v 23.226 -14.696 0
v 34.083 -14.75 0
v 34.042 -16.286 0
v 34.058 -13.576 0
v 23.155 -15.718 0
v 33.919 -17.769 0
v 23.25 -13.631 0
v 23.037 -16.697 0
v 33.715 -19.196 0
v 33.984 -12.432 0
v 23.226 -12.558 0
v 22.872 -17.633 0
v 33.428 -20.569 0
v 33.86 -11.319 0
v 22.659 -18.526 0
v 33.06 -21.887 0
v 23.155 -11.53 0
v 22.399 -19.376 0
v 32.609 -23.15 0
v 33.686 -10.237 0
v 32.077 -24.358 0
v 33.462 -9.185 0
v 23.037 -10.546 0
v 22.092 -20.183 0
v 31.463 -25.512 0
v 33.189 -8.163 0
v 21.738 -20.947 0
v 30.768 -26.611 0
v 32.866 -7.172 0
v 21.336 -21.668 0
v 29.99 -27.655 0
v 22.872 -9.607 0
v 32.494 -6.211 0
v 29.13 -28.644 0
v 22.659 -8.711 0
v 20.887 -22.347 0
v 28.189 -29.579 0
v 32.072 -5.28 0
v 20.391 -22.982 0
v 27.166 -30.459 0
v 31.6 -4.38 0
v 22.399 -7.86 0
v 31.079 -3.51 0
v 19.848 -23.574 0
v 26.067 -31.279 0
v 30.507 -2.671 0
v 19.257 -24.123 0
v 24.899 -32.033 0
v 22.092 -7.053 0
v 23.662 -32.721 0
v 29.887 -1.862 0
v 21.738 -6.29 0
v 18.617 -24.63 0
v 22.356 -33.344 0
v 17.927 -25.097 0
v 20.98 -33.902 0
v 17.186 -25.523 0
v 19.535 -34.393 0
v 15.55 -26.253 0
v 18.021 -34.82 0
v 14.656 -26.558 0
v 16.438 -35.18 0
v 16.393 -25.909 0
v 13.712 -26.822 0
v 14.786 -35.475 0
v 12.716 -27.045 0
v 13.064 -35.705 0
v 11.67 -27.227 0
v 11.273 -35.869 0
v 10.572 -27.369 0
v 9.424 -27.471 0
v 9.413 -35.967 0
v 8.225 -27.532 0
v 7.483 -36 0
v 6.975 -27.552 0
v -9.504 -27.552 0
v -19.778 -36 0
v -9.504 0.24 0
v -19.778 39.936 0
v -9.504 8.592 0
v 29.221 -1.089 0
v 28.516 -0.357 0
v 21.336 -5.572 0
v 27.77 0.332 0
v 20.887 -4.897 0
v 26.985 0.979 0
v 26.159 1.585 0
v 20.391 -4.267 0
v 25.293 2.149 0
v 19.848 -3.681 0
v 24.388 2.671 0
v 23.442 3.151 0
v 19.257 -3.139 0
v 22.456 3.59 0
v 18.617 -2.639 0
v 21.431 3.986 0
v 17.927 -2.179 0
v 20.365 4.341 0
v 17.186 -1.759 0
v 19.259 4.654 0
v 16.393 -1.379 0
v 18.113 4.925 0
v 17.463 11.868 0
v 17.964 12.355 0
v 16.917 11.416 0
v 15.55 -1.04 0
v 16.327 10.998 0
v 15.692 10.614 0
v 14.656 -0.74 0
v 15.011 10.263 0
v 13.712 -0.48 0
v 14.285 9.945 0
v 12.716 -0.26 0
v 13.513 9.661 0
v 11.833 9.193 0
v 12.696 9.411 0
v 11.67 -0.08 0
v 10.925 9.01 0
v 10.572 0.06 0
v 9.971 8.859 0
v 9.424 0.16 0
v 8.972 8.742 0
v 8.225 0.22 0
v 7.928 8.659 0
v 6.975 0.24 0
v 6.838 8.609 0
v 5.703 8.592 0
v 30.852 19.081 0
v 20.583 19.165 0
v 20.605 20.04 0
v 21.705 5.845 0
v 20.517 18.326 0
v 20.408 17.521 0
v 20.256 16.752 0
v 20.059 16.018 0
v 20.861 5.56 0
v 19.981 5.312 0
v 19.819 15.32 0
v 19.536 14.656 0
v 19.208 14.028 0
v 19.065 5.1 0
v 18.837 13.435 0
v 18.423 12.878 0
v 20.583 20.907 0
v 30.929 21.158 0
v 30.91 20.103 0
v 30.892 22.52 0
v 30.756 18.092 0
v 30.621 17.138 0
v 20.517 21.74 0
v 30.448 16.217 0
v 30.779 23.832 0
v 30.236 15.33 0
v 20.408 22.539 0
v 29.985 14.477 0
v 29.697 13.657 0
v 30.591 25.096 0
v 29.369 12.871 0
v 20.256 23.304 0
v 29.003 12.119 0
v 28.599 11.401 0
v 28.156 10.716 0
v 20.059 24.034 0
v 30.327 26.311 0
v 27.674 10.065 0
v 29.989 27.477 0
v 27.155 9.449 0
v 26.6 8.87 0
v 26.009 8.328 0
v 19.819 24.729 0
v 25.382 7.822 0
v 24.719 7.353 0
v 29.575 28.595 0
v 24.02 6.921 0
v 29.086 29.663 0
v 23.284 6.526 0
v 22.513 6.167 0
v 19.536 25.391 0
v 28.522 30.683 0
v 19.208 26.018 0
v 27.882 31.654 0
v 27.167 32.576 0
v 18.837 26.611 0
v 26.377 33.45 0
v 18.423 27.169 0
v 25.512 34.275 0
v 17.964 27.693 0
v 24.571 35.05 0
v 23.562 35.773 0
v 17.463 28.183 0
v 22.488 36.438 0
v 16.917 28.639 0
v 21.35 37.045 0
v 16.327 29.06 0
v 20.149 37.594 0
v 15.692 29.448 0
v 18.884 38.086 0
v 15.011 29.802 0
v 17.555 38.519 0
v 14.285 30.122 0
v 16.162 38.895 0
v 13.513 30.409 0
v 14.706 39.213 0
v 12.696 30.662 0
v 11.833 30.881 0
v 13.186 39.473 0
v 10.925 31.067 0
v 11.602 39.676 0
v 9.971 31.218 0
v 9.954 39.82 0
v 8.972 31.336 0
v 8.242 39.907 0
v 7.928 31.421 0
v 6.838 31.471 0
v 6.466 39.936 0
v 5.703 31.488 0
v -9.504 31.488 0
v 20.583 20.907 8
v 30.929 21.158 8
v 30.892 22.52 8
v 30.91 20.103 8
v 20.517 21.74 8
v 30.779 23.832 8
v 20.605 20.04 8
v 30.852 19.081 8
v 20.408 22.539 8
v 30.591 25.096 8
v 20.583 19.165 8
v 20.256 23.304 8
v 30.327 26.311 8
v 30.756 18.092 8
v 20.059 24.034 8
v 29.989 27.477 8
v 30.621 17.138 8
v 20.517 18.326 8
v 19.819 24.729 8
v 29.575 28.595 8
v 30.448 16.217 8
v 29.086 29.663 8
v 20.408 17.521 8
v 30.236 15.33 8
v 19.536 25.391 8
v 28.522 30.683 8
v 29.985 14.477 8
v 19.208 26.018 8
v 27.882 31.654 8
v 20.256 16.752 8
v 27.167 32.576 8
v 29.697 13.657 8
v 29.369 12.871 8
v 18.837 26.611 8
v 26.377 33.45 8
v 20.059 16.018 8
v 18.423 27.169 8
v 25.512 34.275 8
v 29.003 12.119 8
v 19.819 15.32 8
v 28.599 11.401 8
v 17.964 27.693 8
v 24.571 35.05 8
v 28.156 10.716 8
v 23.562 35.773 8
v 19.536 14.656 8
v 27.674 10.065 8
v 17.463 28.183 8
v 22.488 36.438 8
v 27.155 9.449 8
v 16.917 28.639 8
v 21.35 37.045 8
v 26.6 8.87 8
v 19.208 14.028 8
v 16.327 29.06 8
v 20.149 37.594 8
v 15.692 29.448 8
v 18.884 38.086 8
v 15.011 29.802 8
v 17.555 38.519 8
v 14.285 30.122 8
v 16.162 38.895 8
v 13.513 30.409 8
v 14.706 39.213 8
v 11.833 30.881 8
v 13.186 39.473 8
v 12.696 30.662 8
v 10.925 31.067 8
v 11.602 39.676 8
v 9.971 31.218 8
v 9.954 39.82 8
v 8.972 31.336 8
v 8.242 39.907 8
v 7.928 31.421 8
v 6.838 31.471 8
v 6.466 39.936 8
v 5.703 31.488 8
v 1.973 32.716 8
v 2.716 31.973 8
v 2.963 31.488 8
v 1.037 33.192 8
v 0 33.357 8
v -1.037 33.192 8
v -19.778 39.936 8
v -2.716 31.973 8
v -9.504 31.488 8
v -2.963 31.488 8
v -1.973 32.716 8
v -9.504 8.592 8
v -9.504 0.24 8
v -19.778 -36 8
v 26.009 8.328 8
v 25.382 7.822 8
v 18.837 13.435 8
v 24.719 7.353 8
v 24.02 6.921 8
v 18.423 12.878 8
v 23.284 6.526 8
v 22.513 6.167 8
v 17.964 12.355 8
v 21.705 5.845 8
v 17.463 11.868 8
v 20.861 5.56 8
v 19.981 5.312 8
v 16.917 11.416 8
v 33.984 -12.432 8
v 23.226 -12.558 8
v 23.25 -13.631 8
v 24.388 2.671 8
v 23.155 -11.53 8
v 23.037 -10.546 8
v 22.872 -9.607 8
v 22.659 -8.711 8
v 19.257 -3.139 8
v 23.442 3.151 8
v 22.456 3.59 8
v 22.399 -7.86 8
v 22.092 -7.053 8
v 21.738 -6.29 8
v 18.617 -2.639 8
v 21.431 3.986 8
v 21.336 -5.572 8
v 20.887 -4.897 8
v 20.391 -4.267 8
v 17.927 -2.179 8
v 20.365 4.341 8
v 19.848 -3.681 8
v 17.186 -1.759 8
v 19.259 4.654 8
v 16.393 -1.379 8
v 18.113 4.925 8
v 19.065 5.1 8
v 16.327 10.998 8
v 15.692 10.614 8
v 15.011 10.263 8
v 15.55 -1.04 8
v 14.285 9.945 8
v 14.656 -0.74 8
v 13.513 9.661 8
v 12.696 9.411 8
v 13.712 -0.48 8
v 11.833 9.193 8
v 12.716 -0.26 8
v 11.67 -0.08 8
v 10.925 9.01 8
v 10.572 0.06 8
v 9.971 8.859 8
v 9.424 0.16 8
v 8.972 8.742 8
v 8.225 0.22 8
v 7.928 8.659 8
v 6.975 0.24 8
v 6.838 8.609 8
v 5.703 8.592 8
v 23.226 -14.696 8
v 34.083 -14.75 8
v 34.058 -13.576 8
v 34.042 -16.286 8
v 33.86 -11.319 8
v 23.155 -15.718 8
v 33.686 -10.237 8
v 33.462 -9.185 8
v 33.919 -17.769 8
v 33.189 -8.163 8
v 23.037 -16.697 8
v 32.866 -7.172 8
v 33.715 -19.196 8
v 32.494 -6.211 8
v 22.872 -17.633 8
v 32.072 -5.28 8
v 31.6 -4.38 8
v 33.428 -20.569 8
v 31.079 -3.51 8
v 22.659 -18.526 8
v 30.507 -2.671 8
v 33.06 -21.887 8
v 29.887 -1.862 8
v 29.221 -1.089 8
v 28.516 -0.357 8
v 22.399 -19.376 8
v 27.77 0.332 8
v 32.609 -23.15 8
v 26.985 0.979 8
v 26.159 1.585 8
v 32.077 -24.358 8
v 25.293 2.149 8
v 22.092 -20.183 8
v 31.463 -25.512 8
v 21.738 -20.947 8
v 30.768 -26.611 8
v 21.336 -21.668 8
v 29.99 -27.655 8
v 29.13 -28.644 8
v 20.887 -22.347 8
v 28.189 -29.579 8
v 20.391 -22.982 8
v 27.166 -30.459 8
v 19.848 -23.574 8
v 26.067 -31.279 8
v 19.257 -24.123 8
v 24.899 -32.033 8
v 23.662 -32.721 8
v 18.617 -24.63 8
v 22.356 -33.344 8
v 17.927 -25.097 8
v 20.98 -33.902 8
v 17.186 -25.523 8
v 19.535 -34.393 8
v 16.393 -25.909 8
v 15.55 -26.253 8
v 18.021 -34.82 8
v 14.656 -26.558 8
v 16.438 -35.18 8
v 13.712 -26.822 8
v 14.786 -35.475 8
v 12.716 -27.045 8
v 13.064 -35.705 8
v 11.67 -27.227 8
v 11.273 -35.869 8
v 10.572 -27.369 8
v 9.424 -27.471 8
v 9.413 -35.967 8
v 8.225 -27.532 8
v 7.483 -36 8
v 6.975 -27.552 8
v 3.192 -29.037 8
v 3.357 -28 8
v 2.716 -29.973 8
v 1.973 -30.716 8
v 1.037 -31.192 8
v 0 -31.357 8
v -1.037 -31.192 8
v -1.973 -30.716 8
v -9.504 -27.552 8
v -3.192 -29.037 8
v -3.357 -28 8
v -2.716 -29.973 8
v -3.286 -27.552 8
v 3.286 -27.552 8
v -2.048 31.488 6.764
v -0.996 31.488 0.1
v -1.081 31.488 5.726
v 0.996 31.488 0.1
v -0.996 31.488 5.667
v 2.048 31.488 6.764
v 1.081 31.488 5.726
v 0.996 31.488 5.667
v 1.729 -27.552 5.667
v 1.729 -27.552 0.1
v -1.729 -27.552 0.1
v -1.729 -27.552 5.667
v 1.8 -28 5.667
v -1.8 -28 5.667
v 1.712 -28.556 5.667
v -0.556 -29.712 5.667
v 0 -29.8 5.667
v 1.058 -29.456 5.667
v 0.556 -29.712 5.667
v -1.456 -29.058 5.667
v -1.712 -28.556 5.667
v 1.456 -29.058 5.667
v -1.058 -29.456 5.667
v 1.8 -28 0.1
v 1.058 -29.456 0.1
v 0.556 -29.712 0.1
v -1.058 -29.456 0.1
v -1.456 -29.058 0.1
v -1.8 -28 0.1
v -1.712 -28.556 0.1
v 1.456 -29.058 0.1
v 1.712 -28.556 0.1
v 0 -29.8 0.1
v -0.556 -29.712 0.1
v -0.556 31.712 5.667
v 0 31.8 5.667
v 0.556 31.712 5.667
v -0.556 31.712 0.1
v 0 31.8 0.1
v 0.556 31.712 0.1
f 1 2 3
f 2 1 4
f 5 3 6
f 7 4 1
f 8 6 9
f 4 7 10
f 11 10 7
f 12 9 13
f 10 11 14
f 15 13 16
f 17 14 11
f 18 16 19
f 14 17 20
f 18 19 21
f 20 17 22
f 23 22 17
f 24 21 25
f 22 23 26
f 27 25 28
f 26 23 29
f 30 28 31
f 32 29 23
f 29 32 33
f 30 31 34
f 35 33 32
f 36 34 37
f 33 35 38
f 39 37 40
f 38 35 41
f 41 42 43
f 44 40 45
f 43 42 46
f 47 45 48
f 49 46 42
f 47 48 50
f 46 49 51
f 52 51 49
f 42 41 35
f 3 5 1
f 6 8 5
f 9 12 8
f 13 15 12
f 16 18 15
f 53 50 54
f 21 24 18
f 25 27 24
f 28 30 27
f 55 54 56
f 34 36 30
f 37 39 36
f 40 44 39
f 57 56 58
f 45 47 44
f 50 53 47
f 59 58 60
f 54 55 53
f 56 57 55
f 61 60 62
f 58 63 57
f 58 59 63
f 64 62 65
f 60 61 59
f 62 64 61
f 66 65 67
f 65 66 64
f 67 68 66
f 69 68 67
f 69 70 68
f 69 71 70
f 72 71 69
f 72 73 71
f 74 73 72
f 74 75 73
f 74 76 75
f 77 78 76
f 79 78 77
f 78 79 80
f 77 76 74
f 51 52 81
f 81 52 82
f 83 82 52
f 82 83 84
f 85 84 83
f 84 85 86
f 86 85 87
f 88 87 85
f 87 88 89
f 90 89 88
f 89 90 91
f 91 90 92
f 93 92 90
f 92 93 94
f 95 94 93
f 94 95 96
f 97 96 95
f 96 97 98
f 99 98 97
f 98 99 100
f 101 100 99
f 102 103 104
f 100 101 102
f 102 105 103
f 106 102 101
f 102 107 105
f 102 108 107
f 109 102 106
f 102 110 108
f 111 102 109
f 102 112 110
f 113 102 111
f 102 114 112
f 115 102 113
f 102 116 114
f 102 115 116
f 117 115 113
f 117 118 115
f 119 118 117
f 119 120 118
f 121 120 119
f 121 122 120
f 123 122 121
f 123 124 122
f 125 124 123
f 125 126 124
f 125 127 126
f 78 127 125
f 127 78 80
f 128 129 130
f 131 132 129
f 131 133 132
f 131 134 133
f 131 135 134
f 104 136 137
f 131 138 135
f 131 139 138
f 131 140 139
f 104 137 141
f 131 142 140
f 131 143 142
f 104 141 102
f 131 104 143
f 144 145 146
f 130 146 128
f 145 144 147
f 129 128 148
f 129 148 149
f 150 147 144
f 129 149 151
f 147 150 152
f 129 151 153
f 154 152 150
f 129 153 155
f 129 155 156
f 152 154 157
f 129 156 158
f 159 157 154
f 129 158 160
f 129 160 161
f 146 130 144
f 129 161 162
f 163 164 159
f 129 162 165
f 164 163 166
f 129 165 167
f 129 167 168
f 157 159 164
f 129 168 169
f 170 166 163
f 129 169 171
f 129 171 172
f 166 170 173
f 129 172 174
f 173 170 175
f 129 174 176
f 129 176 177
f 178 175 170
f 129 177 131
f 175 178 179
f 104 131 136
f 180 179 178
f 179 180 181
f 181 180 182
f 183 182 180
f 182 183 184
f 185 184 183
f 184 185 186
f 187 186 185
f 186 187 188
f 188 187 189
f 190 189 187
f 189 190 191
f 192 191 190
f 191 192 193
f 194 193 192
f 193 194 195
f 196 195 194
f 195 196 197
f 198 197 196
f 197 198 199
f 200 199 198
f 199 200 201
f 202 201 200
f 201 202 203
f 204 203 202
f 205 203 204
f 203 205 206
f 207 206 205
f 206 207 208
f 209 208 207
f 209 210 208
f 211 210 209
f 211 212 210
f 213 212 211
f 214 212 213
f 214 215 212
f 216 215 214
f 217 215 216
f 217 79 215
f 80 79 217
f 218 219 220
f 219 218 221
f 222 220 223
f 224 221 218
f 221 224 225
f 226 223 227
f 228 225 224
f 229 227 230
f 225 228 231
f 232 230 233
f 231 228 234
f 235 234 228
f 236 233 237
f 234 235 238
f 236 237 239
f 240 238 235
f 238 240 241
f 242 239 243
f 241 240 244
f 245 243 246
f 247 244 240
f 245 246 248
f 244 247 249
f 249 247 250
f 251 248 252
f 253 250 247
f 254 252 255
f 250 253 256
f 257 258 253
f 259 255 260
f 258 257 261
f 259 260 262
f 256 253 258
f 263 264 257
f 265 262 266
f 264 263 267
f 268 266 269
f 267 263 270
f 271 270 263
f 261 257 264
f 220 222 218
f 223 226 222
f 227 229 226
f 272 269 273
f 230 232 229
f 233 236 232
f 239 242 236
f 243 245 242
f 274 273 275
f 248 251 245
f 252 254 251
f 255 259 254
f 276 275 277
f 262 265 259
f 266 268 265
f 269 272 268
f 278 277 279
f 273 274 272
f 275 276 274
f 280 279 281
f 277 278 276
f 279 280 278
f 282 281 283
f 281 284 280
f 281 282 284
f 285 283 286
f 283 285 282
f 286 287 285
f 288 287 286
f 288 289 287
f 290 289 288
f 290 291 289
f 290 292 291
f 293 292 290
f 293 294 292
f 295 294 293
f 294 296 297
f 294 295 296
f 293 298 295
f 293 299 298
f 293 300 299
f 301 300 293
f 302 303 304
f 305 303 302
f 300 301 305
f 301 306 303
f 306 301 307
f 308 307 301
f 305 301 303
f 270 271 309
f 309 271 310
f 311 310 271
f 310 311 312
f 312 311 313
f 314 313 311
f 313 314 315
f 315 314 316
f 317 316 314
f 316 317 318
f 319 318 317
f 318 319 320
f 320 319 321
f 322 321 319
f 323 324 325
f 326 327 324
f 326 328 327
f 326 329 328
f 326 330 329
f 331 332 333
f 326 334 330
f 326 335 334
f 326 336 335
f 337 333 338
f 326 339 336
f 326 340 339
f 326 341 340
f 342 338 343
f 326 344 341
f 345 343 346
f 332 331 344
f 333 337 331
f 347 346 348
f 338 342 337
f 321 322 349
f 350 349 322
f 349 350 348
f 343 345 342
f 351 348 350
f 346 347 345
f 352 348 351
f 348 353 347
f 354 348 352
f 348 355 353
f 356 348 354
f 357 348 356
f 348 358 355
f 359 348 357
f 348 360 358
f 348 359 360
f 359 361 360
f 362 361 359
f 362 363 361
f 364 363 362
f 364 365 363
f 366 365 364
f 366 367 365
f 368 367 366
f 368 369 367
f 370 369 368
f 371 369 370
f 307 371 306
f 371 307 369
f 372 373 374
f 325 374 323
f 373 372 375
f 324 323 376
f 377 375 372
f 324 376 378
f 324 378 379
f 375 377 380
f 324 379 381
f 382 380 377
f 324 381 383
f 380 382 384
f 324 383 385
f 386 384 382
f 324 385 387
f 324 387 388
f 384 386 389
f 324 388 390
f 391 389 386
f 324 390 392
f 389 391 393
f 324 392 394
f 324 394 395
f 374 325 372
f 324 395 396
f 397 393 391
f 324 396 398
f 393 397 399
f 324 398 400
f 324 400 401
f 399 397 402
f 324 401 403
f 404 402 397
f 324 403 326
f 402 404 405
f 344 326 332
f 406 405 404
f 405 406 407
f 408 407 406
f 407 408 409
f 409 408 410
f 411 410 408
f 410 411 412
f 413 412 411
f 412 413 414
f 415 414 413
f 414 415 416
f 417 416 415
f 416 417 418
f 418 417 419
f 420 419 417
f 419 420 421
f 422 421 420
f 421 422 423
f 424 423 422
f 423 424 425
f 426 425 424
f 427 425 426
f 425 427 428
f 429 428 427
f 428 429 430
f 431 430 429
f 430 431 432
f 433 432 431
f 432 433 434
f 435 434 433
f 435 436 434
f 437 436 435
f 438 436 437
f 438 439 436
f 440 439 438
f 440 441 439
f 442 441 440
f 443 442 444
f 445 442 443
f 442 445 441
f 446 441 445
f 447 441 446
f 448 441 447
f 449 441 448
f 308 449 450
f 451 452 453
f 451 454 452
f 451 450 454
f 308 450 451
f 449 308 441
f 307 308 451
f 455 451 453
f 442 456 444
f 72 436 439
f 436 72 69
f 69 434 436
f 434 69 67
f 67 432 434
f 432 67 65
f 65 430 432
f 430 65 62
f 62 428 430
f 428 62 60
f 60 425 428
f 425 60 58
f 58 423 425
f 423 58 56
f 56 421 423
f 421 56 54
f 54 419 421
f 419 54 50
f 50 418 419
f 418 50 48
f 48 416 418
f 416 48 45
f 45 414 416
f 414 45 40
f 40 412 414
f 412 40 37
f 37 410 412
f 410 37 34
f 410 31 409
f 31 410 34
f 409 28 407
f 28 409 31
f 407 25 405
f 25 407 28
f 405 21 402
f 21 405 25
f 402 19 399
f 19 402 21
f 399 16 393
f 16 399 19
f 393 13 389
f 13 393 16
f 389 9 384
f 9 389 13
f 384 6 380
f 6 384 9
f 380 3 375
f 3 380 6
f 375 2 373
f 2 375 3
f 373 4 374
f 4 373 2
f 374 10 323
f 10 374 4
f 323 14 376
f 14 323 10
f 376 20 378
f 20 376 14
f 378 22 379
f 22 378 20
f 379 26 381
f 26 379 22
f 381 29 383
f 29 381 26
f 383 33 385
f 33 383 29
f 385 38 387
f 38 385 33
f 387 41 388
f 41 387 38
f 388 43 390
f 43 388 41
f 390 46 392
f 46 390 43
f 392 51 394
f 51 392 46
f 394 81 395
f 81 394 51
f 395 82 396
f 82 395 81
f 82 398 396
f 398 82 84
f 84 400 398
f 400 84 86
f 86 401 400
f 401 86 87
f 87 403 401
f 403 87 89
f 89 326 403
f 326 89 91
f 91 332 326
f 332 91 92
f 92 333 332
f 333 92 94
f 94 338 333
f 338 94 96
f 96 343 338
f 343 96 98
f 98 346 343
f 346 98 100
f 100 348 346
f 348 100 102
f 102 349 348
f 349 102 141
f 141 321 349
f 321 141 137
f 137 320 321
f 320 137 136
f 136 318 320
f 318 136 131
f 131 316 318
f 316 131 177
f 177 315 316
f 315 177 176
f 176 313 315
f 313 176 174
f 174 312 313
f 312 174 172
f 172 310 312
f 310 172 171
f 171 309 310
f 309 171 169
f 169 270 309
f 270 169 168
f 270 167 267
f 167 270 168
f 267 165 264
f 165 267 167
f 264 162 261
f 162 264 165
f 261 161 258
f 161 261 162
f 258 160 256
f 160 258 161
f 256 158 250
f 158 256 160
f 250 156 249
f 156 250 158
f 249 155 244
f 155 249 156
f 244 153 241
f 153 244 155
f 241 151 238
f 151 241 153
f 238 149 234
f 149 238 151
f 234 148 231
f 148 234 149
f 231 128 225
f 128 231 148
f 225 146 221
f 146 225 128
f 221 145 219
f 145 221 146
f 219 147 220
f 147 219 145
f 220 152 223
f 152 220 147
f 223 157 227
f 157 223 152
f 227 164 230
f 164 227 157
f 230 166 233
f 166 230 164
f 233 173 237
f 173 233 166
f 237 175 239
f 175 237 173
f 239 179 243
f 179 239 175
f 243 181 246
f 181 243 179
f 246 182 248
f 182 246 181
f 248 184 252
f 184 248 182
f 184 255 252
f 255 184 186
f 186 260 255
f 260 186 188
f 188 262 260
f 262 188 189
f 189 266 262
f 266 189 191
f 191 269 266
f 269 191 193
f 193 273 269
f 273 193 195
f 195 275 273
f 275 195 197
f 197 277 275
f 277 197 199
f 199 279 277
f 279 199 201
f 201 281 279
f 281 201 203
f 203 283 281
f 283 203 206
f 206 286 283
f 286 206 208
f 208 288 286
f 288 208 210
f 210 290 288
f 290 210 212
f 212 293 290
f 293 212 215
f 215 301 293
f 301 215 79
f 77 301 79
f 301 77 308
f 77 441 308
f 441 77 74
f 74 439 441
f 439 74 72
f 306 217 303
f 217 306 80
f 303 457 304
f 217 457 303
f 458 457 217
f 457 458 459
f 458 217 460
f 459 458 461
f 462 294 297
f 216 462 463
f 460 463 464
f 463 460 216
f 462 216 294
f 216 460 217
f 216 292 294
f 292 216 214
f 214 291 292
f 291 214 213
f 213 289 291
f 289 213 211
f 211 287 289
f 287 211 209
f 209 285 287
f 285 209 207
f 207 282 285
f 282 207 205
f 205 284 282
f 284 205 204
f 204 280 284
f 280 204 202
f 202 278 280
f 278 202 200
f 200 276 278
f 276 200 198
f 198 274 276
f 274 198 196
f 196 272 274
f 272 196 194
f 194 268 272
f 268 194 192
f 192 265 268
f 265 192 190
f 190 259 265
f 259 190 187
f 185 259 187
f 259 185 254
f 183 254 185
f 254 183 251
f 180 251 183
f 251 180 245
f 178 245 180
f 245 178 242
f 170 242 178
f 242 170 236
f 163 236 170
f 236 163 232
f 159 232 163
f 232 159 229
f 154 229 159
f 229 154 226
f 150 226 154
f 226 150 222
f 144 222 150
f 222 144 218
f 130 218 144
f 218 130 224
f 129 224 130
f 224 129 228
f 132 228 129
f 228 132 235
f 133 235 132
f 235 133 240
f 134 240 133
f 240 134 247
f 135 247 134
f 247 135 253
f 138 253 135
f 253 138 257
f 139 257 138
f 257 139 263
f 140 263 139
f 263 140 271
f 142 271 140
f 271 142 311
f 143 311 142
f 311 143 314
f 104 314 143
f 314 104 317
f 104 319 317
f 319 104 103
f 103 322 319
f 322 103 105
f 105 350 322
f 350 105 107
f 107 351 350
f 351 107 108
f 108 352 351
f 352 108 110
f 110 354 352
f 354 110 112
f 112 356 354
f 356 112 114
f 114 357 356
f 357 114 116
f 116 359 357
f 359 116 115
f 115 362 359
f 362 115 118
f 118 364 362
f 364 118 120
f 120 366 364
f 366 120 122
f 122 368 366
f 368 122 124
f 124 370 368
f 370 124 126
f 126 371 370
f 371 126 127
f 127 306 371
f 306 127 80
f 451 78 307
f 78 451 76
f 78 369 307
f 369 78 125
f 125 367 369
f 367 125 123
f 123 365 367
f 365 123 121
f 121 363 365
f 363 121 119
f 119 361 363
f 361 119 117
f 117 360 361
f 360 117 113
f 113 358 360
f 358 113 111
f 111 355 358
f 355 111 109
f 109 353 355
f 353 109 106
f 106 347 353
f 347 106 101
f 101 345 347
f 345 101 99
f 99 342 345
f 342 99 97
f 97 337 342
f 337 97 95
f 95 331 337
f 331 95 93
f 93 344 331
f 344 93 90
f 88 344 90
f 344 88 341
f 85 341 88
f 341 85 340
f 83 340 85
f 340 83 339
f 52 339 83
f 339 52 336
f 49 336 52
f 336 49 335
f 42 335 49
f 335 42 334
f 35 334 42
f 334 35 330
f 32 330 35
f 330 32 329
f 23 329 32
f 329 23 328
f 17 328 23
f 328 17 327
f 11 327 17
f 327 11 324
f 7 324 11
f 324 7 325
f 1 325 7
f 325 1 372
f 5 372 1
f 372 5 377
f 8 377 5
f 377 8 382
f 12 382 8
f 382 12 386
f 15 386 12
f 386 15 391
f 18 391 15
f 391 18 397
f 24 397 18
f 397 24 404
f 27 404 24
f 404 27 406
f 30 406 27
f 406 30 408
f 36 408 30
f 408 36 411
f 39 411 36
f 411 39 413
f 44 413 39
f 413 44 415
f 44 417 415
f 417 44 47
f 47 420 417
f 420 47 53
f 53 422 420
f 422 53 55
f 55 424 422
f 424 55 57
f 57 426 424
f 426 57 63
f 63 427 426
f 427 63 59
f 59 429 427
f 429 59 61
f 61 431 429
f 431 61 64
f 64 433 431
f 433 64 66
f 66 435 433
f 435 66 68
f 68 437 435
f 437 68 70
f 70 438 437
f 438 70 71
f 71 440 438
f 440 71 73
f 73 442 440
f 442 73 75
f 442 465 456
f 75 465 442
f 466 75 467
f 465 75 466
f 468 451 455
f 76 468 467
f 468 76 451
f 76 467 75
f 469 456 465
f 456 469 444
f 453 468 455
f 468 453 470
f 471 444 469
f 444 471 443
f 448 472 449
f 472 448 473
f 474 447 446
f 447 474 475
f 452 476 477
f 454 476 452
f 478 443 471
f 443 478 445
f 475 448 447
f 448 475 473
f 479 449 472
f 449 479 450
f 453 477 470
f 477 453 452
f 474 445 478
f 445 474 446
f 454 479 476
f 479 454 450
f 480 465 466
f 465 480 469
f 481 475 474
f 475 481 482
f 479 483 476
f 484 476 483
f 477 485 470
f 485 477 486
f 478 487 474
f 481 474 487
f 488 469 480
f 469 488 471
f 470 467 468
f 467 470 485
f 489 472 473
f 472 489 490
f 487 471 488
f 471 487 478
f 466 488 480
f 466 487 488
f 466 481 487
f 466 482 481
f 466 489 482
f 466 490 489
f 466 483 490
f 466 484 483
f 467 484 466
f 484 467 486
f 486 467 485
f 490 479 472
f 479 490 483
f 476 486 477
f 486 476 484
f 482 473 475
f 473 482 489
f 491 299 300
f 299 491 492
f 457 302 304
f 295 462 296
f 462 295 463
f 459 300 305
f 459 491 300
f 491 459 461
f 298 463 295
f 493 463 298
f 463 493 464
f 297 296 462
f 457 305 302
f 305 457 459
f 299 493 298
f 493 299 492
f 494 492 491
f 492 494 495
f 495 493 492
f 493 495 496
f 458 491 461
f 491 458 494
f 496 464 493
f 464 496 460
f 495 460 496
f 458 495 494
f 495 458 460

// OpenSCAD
// Street Numbers for 3D printing
// Charles Tilford, 2019
// License: CC BY-NC-SA 4.0
//   https://creativecommons.org/licenses/by-nc-sa/4.0/

char="B";     // The number/letter to print

// Units are in mm, except for height of letter

// How many inches high should letter be?
inchesHigh=3;
// How thick/deep should letter be (mm)?
depth=8;

// Character coordinates just center the letter
charX=-30;    // Character X coord
charY=-36;    // Character Y coord
topScrew=30;  // Top screw Y coord
botScrew=-28; // Bottom screw Y coord
height=8;     // Thickness of character
// Screw dimensions. Default presumes
// #6 sheet metal screw
screwWid=3.6; // Width of screw shaft
screwTop=6.78;// Width of screw head
screwCon=5.08;// Height of head 'cone'

// Font to print in. Your system needs this
// installed, of course. If changed the hole
// positions almost certainly need to be
// changed, and maybe charX/charY.
fName="Open Sans Extrabold";
// https://fonts.google.com/specimen/Open+Sans
// Designer: Steve Matteson

// Thin floor below holes. My printer was
// struggling to have the hole 'border' stick
// to the stage. Just drill/screw thru it.
holeFloor=0.1; 

// ==========================================
// ===== All values below are auto-calculated
// ==========================================

// Scaled values
scaleFactor=inchesHigh / 3;
cX=charX * scaleFactor;
cY=charY * scaleFactor;
tS=topScrew * scaleFactor;
bS=botScrew * scaleFactor;
// Where do we start drawing screw head cone?
oS=depth - (screwCon-.05);

difference() {
  // We use difference() to punch out the screw holes
  // in the character
    
  // The character itself, 8mm thick
  translate([cX,cY,0])
    linear_extrude(height=depth, scale=1)
    text(char, size=(75*scaleFactor),
         $fn=100, font=fName);
    
  // Bottom screw hole
  translate([0,bS,oS]) color("red")
    cylinder(h=screwCon, d2=screwTop,
             d1=0, $fn=20);
   translate([0,bS,holeFloor])
    cylinder(h=20, d=screwWid, $fn=20);
    
  // Top screw hole
  translate([0,tS,oS]) color("red")
    cylinder(h=screwCon, d2=screwTop,
             d1=0, $fn=20);
  translate([0,tS,holeFloor])
    cylinder(h=20, d=screwWid, $fn=20);
}

// Colors are just to aid visualization of
// void spaces. $fn is "featuer number", ie how
// many polygons are devoted to object. The values
// above should be near your printing limit anyway.

// Developed in OpenSCAD
//    https://www.openscad.org/
